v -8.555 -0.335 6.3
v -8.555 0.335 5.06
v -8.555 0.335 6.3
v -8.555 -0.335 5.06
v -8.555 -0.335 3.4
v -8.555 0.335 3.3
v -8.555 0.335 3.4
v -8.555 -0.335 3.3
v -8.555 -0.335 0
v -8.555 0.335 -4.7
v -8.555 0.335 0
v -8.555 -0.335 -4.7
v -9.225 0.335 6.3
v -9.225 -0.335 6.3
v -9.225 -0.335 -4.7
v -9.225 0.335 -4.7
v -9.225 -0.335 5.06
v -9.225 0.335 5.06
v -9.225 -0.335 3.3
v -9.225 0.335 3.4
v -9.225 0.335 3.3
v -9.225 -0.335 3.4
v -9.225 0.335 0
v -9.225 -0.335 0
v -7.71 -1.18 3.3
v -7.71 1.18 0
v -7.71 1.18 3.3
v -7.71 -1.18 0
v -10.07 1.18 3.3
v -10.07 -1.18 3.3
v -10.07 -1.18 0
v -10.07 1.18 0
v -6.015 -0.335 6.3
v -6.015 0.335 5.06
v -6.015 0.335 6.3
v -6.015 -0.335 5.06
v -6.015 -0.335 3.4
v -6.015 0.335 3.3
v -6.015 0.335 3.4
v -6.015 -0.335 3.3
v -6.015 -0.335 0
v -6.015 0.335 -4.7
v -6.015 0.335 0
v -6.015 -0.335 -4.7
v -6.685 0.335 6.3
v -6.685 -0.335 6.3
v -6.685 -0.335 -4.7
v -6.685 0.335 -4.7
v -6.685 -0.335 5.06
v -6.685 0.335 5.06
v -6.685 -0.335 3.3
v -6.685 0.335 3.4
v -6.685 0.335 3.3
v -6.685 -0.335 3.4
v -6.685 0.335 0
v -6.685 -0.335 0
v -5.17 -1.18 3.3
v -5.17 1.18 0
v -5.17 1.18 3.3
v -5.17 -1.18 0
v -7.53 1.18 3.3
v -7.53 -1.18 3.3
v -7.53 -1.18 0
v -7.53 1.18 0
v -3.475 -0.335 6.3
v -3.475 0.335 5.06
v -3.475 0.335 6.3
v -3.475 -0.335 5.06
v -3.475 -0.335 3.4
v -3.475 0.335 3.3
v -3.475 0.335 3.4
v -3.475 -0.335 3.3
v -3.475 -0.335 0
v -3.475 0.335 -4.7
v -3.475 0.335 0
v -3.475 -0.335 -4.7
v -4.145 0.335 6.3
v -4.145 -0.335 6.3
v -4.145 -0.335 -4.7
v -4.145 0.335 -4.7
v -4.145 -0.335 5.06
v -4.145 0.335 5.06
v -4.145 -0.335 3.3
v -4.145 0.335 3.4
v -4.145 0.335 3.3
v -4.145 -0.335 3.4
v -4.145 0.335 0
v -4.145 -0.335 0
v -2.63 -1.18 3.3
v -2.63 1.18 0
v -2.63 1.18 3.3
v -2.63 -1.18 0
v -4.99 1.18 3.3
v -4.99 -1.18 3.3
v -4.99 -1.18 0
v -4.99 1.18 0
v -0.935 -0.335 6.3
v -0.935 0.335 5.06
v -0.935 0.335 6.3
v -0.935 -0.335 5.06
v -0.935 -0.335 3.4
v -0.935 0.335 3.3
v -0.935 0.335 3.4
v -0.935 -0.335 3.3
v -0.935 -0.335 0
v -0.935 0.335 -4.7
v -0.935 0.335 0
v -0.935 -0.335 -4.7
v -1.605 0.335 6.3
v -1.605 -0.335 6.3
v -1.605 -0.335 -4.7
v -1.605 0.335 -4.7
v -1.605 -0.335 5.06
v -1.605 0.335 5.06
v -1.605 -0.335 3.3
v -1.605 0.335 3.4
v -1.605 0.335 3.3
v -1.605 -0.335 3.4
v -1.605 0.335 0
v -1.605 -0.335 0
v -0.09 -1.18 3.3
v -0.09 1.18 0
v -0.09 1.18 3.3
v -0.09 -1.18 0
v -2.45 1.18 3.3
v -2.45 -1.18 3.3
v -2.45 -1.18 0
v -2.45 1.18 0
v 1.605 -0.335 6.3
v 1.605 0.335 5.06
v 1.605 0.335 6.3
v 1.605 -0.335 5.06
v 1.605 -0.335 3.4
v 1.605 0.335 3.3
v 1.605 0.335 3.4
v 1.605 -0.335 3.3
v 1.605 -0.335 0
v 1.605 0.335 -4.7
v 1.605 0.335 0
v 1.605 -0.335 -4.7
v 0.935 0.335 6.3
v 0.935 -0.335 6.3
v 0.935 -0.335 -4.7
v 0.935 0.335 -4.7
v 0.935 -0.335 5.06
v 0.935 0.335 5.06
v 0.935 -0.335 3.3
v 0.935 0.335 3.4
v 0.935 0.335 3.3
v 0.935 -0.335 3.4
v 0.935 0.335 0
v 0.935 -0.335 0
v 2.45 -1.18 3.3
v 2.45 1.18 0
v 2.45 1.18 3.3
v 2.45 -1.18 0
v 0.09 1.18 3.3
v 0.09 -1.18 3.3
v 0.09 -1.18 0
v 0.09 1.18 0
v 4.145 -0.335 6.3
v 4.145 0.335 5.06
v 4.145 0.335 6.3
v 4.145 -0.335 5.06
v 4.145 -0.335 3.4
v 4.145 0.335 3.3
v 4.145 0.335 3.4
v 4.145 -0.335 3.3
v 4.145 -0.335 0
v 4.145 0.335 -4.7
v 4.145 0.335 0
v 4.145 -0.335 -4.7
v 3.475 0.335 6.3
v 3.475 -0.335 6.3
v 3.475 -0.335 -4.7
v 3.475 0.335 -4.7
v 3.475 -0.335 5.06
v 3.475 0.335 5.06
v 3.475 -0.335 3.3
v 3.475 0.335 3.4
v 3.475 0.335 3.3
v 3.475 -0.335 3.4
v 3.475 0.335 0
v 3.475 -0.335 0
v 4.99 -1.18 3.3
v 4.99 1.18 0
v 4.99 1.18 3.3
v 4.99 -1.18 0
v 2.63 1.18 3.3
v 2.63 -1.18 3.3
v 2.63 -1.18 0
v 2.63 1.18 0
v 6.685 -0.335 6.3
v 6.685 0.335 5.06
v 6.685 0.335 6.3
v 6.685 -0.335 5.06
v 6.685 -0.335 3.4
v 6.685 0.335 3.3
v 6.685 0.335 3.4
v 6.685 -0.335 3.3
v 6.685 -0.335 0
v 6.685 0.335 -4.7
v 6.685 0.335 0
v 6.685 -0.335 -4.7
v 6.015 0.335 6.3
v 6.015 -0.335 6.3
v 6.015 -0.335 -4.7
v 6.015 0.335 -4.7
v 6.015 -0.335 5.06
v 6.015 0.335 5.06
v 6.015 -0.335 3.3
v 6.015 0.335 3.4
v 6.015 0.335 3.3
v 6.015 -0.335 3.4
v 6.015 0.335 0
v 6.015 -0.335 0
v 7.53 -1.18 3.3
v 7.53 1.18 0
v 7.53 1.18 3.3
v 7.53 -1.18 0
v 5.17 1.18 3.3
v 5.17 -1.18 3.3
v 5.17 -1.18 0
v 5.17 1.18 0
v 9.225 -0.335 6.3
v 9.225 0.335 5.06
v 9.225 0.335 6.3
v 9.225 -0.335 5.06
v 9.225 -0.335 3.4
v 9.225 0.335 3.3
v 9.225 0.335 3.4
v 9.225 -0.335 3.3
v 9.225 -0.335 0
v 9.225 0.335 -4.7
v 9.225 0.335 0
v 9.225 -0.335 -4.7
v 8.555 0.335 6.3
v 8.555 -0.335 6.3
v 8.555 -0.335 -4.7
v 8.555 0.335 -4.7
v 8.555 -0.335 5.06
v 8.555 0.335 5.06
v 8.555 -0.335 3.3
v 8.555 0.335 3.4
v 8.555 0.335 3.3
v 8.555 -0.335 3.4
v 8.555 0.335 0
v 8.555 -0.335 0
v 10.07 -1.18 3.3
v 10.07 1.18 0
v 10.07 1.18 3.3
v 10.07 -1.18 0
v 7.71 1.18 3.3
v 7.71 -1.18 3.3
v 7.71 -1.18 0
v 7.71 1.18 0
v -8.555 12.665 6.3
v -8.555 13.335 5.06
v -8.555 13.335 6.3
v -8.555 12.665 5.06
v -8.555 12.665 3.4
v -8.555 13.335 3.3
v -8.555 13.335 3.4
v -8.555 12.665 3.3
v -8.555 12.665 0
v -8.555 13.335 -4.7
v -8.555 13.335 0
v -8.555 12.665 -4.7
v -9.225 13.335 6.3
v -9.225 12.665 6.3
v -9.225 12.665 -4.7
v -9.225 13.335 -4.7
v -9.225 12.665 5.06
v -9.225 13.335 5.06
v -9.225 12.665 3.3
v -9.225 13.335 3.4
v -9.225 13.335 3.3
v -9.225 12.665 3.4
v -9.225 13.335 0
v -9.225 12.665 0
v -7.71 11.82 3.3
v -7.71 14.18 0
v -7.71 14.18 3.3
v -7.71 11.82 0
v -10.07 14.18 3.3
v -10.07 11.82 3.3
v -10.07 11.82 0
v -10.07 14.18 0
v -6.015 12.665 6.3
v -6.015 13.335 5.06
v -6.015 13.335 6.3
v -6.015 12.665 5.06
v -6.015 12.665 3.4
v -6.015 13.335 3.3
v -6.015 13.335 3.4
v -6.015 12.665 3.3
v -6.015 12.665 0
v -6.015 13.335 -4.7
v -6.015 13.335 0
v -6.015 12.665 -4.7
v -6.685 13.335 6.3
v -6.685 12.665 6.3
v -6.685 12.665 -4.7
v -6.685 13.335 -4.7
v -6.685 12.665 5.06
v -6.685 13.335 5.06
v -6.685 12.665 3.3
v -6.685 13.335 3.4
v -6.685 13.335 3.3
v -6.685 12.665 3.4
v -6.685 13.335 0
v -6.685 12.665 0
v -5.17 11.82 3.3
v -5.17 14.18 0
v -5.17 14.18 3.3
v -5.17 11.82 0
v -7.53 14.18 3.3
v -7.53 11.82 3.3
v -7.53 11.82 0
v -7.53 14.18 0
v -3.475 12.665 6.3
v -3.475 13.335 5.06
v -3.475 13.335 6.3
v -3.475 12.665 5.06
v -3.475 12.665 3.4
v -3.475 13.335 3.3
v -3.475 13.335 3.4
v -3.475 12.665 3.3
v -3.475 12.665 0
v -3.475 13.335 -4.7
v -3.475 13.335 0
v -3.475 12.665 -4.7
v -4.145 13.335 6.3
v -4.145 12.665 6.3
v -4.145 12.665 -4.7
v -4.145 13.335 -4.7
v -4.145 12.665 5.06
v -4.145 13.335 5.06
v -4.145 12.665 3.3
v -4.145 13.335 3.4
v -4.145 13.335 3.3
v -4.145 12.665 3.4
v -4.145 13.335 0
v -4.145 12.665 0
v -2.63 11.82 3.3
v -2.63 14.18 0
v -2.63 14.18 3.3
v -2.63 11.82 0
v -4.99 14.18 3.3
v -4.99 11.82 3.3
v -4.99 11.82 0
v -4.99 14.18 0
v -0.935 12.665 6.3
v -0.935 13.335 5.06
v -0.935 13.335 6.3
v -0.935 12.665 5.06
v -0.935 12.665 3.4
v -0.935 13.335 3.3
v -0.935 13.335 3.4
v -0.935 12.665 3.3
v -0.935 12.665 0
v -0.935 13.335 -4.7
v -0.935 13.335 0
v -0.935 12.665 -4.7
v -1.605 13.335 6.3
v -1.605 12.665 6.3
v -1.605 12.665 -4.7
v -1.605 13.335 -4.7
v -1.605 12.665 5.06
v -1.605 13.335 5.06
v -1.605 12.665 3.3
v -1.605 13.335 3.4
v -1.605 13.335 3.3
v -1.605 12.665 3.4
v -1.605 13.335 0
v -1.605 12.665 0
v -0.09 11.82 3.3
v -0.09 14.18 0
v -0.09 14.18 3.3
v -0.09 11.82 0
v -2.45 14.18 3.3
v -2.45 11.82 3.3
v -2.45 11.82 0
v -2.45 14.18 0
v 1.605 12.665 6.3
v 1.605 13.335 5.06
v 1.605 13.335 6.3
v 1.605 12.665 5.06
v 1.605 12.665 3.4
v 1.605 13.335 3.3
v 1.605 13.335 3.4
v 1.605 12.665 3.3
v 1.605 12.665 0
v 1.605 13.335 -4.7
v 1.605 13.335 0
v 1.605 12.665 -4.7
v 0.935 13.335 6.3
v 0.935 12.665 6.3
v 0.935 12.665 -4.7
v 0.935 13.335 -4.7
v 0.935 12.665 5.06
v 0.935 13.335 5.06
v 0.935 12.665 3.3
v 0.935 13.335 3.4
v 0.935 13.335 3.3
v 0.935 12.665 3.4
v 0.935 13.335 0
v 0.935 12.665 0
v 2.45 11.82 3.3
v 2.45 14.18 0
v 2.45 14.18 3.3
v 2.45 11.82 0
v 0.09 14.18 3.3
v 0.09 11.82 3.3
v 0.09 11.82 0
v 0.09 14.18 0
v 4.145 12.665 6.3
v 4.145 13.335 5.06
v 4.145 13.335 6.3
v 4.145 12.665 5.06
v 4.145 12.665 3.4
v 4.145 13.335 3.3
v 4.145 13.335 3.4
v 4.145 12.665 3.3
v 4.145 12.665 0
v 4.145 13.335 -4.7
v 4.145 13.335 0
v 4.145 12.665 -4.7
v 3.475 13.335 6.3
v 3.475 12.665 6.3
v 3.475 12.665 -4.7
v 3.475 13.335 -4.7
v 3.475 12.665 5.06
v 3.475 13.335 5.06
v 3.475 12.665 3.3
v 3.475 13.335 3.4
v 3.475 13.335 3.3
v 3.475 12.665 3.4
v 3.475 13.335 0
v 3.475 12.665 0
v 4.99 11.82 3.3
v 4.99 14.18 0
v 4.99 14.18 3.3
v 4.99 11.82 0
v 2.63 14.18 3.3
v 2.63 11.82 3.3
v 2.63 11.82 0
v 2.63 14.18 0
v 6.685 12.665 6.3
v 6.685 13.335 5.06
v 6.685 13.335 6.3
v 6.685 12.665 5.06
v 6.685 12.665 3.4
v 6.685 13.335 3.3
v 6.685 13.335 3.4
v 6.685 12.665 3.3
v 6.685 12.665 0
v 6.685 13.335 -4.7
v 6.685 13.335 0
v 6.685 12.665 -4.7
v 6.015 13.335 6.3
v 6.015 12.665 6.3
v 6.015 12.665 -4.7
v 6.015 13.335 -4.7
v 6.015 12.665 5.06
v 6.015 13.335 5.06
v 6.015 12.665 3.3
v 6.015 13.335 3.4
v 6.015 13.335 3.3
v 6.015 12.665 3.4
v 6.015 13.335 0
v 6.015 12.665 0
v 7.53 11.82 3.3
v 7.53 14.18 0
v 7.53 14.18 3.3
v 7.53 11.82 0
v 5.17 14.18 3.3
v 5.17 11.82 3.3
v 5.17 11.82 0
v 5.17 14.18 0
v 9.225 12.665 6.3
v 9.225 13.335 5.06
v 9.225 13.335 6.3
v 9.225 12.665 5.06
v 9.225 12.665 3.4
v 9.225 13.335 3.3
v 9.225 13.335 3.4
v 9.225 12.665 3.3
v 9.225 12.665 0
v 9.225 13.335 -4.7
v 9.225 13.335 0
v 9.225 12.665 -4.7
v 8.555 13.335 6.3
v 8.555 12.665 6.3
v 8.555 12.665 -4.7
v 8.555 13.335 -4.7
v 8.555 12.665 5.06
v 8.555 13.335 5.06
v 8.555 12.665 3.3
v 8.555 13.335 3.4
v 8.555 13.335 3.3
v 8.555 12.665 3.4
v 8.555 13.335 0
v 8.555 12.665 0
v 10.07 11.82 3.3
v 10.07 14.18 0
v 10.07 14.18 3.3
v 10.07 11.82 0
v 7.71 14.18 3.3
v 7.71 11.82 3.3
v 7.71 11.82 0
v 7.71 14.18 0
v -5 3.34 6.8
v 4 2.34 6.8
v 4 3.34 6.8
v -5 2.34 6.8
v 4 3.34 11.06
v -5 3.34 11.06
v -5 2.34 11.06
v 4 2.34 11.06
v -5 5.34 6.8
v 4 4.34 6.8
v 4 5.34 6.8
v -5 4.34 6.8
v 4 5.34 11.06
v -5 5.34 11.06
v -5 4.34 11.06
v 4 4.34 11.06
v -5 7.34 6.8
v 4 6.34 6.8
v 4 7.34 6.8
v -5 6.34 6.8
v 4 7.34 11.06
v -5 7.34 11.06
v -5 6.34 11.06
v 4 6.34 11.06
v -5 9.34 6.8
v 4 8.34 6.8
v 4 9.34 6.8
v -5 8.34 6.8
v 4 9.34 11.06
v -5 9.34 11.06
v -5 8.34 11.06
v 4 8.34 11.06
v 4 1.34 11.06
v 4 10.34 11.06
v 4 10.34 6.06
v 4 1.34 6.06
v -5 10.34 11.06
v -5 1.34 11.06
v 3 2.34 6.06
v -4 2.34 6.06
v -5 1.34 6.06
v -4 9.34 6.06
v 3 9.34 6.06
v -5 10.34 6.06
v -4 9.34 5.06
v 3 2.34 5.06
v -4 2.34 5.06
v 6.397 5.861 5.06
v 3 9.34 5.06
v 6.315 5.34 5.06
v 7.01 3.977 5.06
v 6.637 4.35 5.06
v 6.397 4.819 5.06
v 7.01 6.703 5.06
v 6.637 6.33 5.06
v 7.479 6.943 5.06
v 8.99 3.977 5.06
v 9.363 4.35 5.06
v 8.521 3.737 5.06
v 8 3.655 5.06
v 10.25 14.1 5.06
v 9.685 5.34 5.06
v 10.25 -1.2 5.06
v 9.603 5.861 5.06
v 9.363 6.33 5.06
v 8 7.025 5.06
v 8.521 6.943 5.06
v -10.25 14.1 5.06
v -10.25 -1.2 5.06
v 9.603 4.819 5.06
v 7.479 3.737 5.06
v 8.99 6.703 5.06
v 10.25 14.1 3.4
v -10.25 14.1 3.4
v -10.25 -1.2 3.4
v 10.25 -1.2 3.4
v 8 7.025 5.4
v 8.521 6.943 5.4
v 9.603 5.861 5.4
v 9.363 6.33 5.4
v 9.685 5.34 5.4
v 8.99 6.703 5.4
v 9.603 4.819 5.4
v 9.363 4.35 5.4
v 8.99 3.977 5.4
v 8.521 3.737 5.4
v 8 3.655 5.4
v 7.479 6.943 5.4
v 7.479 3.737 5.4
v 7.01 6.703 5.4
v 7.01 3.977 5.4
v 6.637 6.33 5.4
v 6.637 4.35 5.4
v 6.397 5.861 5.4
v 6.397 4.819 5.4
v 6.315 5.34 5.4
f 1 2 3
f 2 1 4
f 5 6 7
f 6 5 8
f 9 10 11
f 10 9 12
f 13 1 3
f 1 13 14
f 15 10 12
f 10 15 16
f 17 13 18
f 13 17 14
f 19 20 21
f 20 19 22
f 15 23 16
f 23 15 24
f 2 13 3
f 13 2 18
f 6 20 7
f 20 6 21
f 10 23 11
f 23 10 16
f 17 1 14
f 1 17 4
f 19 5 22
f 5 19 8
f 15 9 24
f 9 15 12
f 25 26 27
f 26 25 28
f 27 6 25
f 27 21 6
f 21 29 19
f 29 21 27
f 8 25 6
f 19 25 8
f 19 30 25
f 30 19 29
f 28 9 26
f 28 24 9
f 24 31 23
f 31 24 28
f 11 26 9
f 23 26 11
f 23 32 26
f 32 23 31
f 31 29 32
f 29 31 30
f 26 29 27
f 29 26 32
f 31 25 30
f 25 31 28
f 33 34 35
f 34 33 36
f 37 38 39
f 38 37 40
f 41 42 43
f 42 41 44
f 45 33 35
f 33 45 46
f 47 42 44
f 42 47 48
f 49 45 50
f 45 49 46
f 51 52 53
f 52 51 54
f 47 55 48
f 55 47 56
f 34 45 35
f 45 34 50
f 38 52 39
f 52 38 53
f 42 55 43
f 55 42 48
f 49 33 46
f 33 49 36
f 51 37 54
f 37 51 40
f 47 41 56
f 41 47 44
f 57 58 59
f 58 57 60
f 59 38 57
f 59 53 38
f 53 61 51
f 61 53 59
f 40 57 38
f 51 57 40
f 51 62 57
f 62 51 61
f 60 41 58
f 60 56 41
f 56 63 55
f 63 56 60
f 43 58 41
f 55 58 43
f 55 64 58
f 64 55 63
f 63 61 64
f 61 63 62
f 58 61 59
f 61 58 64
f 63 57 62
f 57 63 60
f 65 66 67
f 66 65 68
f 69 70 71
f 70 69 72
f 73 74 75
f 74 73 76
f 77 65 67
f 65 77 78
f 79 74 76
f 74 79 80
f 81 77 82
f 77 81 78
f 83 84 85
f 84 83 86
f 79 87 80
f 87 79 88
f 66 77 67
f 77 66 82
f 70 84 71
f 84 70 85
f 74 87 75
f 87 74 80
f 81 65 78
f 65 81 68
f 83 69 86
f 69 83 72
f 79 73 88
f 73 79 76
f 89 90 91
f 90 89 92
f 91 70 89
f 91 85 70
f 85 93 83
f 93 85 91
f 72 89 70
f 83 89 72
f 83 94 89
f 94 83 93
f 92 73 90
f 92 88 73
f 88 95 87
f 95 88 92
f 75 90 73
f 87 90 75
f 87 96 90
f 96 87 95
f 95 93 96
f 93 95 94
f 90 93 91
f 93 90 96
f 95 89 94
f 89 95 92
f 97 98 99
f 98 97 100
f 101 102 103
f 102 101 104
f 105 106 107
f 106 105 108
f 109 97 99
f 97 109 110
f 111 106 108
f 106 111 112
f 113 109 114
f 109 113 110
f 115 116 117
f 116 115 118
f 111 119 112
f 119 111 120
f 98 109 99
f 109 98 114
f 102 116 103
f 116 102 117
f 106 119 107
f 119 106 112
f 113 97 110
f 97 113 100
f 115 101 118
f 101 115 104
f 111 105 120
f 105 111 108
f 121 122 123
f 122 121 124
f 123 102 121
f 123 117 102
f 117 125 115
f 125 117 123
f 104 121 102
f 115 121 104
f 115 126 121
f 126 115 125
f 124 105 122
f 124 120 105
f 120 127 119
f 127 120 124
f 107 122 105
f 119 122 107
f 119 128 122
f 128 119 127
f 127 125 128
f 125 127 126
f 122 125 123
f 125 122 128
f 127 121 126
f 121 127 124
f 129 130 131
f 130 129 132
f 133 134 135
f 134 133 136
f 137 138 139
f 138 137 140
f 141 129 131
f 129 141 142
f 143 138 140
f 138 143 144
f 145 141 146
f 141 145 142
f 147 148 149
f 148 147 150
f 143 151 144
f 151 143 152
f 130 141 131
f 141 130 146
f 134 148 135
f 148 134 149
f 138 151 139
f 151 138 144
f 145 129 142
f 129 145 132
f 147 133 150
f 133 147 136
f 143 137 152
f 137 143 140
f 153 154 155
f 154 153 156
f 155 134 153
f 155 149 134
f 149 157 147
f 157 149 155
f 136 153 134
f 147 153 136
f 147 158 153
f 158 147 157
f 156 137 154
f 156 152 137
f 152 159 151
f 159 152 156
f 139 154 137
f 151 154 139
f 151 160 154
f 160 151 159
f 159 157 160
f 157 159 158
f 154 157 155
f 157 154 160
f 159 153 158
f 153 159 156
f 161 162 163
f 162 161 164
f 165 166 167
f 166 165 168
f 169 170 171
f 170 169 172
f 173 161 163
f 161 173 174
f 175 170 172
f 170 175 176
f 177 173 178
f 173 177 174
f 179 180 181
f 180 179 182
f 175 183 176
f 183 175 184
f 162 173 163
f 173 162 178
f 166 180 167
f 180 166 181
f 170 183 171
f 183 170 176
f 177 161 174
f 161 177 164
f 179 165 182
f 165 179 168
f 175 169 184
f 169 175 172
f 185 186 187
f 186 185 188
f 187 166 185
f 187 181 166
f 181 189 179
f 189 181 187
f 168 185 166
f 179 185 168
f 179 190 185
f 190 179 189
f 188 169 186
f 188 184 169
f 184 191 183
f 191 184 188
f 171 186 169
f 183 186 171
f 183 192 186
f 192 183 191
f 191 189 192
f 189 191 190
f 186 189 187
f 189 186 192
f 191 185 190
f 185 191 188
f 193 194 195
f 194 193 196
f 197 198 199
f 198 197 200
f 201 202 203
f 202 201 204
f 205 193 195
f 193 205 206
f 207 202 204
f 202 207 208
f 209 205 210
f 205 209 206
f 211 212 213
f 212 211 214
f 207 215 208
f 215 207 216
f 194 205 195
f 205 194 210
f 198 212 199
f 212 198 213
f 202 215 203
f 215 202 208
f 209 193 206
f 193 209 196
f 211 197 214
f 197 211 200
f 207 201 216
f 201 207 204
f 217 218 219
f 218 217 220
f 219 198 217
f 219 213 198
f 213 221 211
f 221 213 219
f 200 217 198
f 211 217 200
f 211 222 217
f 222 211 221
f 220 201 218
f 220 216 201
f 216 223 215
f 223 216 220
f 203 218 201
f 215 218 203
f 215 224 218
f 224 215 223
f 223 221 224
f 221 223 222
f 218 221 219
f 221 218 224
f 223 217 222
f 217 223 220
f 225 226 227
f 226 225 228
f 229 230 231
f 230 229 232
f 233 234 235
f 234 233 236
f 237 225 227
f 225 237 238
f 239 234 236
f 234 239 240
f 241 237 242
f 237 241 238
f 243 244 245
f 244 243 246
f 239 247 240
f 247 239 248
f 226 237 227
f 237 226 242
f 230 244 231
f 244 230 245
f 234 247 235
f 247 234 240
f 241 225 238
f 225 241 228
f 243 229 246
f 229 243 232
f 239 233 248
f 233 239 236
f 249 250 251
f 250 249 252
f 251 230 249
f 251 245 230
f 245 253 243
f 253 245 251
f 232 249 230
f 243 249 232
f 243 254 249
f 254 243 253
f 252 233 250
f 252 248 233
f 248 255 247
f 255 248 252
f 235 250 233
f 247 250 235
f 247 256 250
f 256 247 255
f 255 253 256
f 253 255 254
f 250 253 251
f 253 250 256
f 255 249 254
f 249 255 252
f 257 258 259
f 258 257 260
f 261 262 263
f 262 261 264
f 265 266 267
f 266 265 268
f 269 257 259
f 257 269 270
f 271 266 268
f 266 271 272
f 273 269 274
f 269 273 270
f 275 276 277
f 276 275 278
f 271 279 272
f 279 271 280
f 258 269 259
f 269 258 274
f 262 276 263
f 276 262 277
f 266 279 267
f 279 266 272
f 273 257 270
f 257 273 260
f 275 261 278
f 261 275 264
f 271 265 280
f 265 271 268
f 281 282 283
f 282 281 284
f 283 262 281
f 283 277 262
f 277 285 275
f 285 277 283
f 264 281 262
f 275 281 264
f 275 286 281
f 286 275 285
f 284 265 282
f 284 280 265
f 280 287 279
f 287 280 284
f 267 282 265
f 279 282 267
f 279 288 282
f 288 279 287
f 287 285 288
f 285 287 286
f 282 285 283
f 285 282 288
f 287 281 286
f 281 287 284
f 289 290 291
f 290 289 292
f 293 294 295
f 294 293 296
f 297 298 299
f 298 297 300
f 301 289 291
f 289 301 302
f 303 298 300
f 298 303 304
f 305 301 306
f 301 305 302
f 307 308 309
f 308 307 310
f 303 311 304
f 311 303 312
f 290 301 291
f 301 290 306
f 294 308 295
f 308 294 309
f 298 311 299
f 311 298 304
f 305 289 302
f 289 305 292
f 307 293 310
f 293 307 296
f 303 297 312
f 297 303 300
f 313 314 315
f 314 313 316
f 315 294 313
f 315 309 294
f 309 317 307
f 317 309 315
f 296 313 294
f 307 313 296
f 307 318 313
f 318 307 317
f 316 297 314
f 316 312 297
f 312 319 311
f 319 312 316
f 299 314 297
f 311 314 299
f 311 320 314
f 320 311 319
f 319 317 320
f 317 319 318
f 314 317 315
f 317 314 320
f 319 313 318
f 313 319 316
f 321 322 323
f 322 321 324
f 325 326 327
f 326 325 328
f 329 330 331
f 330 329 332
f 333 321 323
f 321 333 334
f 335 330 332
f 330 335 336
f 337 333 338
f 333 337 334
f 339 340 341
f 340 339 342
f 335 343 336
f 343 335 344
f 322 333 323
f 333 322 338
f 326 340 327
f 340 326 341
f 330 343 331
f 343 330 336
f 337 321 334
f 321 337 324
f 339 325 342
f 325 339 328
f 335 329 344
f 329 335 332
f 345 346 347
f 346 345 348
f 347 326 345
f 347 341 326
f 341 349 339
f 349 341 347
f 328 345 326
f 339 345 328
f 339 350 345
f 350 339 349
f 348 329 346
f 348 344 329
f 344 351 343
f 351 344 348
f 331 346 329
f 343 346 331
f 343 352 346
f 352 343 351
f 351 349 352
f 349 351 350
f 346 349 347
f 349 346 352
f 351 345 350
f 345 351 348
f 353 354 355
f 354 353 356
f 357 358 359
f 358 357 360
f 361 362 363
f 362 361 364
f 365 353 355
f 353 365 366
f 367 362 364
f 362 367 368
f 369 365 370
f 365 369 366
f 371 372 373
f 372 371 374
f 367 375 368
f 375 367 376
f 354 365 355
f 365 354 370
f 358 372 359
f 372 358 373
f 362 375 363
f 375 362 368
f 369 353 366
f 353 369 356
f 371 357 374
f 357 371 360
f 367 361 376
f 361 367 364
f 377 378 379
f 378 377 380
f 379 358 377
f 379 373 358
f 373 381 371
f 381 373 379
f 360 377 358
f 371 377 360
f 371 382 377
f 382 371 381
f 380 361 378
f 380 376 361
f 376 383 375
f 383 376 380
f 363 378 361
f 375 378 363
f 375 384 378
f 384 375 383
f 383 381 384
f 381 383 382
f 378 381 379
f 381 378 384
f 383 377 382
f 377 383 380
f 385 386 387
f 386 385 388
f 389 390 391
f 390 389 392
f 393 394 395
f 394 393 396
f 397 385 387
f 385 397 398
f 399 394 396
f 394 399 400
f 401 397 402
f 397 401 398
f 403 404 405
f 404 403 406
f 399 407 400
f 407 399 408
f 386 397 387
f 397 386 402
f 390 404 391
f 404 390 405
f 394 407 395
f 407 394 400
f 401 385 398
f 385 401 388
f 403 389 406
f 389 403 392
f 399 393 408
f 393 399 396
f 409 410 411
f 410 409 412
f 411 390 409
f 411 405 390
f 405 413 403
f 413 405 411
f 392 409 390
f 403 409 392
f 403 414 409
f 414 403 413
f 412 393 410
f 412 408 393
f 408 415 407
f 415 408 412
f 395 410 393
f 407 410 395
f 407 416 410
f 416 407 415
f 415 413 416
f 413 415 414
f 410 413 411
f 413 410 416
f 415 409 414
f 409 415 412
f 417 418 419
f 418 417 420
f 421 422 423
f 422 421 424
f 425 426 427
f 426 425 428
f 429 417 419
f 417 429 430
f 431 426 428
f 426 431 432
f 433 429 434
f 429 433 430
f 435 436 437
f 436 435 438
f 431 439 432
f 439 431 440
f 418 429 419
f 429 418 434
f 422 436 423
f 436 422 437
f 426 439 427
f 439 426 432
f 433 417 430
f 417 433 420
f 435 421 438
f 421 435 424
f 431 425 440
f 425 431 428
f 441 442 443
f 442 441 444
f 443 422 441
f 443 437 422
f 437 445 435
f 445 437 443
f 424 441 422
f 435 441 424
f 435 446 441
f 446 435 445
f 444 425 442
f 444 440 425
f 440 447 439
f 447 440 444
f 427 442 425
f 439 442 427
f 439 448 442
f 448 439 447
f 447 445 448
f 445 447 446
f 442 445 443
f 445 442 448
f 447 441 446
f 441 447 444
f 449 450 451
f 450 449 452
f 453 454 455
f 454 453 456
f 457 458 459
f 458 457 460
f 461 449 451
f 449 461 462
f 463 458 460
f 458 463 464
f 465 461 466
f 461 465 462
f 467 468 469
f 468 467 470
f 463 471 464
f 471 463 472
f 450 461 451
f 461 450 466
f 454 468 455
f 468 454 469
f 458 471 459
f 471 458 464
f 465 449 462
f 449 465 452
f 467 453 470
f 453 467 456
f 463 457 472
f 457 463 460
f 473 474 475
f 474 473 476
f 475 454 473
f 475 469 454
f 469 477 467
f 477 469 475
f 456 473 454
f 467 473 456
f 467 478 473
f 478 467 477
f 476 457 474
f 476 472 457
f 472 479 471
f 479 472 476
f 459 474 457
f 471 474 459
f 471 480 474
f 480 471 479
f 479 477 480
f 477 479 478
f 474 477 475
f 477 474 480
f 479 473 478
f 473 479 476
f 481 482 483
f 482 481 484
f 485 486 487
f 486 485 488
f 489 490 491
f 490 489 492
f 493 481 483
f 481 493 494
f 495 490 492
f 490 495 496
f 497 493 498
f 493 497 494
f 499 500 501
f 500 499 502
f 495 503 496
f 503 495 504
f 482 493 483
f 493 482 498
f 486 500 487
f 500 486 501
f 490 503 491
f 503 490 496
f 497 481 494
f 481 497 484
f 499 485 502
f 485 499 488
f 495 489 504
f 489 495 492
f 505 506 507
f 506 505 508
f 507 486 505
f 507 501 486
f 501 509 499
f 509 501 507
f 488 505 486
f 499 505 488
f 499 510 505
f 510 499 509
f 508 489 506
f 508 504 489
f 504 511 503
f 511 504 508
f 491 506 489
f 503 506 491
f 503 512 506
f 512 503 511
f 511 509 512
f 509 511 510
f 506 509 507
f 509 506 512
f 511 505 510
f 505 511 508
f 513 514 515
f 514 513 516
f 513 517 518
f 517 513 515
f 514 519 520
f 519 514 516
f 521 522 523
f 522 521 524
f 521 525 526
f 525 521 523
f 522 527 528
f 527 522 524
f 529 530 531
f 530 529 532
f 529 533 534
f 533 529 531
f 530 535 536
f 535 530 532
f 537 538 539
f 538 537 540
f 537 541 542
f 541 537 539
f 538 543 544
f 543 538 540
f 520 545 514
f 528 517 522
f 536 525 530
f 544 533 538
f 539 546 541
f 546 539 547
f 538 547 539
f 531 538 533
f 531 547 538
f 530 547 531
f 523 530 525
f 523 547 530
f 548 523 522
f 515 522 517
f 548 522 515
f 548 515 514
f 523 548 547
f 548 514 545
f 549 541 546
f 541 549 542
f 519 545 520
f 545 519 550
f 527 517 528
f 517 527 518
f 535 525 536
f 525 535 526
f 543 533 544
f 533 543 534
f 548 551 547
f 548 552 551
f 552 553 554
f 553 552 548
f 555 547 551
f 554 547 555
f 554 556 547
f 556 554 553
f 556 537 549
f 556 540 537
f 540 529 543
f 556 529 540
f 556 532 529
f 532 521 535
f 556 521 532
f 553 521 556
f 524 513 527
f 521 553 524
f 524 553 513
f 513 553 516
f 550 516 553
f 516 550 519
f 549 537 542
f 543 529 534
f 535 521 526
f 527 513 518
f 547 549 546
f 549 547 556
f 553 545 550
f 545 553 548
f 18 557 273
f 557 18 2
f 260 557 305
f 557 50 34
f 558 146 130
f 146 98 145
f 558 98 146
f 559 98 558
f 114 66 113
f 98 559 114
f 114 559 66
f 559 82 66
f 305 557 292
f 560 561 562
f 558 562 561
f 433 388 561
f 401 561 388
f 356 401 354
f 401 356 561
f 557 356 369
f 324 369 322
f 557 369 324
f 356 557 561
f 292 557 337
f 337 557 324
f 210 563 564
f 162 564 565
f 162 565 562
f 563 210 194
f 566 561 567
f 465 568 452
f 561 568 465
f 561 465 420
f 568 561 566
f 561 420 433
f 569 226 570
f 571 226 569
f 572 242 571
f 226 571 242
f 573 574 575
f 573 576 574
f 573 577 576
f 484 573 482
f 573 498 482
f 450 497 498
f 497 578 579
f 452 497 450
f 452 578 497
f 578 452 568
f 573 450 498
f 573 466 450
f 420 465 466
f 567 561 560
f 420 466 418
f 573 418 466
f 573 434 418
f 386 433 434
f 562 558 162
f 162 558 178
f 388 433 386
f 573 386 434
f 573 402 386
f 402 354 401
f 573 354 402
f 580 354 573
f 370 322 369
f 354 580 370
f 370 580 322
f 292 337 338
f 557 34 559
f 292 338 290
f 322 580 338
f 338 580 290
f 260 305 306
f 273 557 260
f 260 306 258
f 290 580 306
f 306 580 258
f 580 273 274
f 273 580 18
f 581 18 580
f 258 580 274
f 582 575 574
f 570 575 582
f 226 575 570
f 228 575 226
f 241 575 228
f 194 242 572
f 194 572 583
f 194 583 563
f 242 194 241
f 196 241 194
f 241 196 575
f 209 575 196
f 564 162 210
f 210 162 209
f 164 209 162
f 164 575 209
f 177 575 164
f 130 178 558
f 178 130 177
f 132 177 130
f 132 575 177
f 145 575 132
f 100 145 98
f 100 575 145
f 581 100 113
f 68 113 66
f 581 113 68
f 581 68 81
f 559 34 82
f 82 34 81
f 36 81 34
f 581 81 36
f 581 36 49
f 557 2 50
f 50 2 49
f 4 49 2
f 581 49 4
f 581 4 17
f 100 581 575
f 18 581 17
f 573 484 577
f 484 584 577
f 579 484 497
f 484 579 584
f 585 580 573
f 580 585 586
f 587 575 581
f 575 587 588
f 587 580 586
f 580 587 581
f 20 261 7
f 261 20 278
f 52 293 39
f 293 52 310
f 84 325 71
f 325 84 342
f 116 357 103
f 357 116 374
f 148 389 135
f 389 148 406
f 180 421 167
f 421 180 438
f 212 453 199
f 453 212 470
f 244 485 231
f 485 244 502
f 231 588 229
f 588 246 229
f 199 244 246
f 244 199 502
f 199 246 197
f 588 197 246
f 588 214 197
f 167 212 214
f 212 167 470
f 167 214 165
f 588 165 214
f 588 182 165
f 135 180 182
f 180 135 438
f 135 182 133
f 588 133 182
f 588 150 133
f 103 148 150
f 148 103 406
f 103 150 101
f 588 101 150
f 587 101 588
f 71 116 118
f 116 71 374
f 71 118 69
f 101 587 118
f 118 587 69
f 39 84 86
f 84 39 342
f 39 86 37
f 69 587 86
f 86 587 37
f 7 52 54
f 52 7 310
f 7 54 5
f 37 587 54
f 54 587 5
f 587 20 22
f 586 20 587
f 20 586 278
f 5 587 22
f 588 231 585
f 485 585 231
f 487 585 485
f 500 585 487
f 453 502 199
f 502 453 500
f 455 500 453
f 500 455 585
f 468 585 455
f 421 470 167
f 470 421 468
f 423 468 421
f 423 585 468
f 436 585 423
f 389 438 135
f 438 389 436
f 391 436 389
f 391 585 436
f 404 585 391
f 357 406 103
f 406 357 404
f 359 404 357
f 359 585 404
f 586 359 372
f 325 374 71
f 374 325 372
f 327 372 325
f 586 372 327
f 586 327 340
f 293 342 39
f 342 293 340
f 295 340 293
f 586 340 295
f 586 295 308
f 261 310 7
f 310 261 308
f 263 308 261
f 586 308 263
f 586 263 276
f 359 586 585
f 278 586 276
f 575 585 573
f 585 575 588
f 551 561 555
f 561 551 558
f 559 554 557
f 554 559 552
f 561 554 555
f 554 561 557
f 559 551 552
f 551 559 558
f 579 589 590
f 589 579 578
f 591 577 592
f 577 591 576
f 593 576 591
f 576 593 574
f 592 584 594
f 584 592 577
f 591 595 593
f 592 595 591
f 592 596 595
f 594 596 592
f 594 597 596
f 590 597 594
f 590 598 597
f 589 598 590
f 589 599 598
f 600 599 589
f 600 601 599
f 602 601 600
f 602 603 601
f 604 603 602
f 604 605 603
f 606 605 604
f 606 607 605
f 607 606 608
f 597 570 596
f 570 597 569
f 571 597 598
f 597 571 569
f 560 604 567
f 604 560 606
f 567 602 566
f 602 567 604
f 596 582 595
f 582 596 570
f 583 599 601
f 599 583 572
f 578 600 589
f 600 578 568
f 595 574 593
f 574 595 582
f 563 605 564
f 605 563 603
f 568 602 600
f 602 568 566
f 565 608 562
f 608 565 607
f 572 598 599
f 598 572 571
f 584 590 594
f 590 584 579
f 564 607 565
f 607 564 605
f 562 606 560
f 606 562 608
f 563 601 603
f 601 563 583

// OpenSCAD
/* Pololu stepper driver board
  Neeraj Verma
  July 23 2018
  GPL V3
  
  use </path/to/libraries/step_stick.scad>
  //full
  step_stick(sinkHeight=5);
  //simple
  step_stick();
*/

/*
  Breakaway Header Pins: pitch 2.54, adjustable
  Aaron Ciuffo
  December 23 2015
  GPL V3
  derived from Molex KK 100 break-away header:
  http://www.molex.com/pdm_docs/sd/022032041_sd.pdf
  Usage (default values shown): 
  ```
  use </path/to/libraries/header_pins.scad>
  //full
  headerPins(columns = 3, rows = 2, centerV = false, center = true, pitch = 2.52);
  //simple
  headerPins(3, 2);
  ```
  columns = integer number of columns (X axis)
  rows = integer number of rows (Y axis)
  centerV = vertically center around base - fale places bottom at origin
  center = center the array at the origin
  pitch = distance between center of each pin
  Note: 
  * the breakaway connector is a bit of a fudge and does not appear at the same
    Z height for centered/versus non centered; this should be largely irrelevant 
  updates can be found at GitHub:
  https://github.com/txoof/OpenSCAD_electronics
*/

sinkHeight=5;


module singlePin(center = false, locate = false, v = false, pinHeight=14.22, pinAboveNylon = 7.49) {
  pinDimensions = [.67, .67, pinHeight];
  nylonDimensions = [2.36, 2.36, 3.3];

  trans = center == false ? [0, 0, nylonDimensions[2]/2] : [0, 0, 0];

  translate(trans)
  union() {
    translate([0, 0, (-pinDimensions[2]/2+nylonDimensions[2]/2)+pinAboveNylon])
      color("gold")
      cube(pinDimensions, center = true);    
    color("darkgray")
      cube(nylonDimensions, center =true);
    if (locate) {
      color("red")
        cylinder(r = 0.1, h = pinDimensions[2]*5, center = true);
    }
  }

  if (v) {
    echo("single pin dimension:", pinDimensions);
    echo("pin above nylon:", pinAboveNylon);
  }

}

module headerPins(columns = 3, rows = 2, centerV = false, center = true, 
                  pitch = 2.54, locate = false, v = false, pinHeight=14.22, pinAboveNylon=7.49) {
  transV = centerV == false ? pitch/2 : 0; // vertical center

  trans = center == false ? [0, 0, 0] : [-(columns-1)*pitch/2, -(rows-1)*pitch/2, 0];
  if (v) {
    echo("header pin array");
    echo("usage: columns, rows, centerV, center, pitch, locate, v(erbose)");
  }

  translate(trans) 
  union() {
    for (i = [0:columns-1]) {
      for (j = [0:rows-1]) {
        translate([pitch*i, pitch*j, 0])
          singlePin(locate = locate, v = v, pinHeight=pinHeight, pinAboveNylon=pinAboveNylon);
      }
    }
    translate([0, 0, -pitch/2+transV])
      color("black")
      cube([pitch*(columns-1), pitch*(rows-1), 2]);
  }
}

module board(sinkHeight=5) {
// pcb
translate([15.25,0,0]) rotate(90) color("red") cube([15.3,20.5,1.66]);   
// chip
translate([1,3.54,1.66]) cube([7,7,1]);    
// heat sink    
color("silver") difference() {
    translate([0,2.54,2.66]) cube([9,9,sinkHeight]);
    union() {
        translate([-.1,3.54,3.4]) cube([10,1,sinkHeight+1]);
        translate([-.1,5.54,3.4]) cube([10,1,sinkHeight+1]);
        translate([-.1,7.54,3.4]) cube([10,1,sinkHeight+1]);
        translate([-.1,9.54,3.4]) cube([10,1,sinkHeight+1]);
    }    
}    
// pot
translate([13,6.54,1.5]) color("silver") cylinder(h=0.5,d=3.37, $fn=20);   
} 

module step_stick(sinkHeight=5) {
    headerPins(8, 1, pinAboveNylon=3, pinHeight=11);
    translate ([0,13,0]) headerPins(8, 1, pinAboveNylon=3, pinHeight=11);
    translate([-5,-1.2, 3.4]) board(sinkHeight=sinkHeight);
}

  step_stick(sinkHeight=sinkHeight);
